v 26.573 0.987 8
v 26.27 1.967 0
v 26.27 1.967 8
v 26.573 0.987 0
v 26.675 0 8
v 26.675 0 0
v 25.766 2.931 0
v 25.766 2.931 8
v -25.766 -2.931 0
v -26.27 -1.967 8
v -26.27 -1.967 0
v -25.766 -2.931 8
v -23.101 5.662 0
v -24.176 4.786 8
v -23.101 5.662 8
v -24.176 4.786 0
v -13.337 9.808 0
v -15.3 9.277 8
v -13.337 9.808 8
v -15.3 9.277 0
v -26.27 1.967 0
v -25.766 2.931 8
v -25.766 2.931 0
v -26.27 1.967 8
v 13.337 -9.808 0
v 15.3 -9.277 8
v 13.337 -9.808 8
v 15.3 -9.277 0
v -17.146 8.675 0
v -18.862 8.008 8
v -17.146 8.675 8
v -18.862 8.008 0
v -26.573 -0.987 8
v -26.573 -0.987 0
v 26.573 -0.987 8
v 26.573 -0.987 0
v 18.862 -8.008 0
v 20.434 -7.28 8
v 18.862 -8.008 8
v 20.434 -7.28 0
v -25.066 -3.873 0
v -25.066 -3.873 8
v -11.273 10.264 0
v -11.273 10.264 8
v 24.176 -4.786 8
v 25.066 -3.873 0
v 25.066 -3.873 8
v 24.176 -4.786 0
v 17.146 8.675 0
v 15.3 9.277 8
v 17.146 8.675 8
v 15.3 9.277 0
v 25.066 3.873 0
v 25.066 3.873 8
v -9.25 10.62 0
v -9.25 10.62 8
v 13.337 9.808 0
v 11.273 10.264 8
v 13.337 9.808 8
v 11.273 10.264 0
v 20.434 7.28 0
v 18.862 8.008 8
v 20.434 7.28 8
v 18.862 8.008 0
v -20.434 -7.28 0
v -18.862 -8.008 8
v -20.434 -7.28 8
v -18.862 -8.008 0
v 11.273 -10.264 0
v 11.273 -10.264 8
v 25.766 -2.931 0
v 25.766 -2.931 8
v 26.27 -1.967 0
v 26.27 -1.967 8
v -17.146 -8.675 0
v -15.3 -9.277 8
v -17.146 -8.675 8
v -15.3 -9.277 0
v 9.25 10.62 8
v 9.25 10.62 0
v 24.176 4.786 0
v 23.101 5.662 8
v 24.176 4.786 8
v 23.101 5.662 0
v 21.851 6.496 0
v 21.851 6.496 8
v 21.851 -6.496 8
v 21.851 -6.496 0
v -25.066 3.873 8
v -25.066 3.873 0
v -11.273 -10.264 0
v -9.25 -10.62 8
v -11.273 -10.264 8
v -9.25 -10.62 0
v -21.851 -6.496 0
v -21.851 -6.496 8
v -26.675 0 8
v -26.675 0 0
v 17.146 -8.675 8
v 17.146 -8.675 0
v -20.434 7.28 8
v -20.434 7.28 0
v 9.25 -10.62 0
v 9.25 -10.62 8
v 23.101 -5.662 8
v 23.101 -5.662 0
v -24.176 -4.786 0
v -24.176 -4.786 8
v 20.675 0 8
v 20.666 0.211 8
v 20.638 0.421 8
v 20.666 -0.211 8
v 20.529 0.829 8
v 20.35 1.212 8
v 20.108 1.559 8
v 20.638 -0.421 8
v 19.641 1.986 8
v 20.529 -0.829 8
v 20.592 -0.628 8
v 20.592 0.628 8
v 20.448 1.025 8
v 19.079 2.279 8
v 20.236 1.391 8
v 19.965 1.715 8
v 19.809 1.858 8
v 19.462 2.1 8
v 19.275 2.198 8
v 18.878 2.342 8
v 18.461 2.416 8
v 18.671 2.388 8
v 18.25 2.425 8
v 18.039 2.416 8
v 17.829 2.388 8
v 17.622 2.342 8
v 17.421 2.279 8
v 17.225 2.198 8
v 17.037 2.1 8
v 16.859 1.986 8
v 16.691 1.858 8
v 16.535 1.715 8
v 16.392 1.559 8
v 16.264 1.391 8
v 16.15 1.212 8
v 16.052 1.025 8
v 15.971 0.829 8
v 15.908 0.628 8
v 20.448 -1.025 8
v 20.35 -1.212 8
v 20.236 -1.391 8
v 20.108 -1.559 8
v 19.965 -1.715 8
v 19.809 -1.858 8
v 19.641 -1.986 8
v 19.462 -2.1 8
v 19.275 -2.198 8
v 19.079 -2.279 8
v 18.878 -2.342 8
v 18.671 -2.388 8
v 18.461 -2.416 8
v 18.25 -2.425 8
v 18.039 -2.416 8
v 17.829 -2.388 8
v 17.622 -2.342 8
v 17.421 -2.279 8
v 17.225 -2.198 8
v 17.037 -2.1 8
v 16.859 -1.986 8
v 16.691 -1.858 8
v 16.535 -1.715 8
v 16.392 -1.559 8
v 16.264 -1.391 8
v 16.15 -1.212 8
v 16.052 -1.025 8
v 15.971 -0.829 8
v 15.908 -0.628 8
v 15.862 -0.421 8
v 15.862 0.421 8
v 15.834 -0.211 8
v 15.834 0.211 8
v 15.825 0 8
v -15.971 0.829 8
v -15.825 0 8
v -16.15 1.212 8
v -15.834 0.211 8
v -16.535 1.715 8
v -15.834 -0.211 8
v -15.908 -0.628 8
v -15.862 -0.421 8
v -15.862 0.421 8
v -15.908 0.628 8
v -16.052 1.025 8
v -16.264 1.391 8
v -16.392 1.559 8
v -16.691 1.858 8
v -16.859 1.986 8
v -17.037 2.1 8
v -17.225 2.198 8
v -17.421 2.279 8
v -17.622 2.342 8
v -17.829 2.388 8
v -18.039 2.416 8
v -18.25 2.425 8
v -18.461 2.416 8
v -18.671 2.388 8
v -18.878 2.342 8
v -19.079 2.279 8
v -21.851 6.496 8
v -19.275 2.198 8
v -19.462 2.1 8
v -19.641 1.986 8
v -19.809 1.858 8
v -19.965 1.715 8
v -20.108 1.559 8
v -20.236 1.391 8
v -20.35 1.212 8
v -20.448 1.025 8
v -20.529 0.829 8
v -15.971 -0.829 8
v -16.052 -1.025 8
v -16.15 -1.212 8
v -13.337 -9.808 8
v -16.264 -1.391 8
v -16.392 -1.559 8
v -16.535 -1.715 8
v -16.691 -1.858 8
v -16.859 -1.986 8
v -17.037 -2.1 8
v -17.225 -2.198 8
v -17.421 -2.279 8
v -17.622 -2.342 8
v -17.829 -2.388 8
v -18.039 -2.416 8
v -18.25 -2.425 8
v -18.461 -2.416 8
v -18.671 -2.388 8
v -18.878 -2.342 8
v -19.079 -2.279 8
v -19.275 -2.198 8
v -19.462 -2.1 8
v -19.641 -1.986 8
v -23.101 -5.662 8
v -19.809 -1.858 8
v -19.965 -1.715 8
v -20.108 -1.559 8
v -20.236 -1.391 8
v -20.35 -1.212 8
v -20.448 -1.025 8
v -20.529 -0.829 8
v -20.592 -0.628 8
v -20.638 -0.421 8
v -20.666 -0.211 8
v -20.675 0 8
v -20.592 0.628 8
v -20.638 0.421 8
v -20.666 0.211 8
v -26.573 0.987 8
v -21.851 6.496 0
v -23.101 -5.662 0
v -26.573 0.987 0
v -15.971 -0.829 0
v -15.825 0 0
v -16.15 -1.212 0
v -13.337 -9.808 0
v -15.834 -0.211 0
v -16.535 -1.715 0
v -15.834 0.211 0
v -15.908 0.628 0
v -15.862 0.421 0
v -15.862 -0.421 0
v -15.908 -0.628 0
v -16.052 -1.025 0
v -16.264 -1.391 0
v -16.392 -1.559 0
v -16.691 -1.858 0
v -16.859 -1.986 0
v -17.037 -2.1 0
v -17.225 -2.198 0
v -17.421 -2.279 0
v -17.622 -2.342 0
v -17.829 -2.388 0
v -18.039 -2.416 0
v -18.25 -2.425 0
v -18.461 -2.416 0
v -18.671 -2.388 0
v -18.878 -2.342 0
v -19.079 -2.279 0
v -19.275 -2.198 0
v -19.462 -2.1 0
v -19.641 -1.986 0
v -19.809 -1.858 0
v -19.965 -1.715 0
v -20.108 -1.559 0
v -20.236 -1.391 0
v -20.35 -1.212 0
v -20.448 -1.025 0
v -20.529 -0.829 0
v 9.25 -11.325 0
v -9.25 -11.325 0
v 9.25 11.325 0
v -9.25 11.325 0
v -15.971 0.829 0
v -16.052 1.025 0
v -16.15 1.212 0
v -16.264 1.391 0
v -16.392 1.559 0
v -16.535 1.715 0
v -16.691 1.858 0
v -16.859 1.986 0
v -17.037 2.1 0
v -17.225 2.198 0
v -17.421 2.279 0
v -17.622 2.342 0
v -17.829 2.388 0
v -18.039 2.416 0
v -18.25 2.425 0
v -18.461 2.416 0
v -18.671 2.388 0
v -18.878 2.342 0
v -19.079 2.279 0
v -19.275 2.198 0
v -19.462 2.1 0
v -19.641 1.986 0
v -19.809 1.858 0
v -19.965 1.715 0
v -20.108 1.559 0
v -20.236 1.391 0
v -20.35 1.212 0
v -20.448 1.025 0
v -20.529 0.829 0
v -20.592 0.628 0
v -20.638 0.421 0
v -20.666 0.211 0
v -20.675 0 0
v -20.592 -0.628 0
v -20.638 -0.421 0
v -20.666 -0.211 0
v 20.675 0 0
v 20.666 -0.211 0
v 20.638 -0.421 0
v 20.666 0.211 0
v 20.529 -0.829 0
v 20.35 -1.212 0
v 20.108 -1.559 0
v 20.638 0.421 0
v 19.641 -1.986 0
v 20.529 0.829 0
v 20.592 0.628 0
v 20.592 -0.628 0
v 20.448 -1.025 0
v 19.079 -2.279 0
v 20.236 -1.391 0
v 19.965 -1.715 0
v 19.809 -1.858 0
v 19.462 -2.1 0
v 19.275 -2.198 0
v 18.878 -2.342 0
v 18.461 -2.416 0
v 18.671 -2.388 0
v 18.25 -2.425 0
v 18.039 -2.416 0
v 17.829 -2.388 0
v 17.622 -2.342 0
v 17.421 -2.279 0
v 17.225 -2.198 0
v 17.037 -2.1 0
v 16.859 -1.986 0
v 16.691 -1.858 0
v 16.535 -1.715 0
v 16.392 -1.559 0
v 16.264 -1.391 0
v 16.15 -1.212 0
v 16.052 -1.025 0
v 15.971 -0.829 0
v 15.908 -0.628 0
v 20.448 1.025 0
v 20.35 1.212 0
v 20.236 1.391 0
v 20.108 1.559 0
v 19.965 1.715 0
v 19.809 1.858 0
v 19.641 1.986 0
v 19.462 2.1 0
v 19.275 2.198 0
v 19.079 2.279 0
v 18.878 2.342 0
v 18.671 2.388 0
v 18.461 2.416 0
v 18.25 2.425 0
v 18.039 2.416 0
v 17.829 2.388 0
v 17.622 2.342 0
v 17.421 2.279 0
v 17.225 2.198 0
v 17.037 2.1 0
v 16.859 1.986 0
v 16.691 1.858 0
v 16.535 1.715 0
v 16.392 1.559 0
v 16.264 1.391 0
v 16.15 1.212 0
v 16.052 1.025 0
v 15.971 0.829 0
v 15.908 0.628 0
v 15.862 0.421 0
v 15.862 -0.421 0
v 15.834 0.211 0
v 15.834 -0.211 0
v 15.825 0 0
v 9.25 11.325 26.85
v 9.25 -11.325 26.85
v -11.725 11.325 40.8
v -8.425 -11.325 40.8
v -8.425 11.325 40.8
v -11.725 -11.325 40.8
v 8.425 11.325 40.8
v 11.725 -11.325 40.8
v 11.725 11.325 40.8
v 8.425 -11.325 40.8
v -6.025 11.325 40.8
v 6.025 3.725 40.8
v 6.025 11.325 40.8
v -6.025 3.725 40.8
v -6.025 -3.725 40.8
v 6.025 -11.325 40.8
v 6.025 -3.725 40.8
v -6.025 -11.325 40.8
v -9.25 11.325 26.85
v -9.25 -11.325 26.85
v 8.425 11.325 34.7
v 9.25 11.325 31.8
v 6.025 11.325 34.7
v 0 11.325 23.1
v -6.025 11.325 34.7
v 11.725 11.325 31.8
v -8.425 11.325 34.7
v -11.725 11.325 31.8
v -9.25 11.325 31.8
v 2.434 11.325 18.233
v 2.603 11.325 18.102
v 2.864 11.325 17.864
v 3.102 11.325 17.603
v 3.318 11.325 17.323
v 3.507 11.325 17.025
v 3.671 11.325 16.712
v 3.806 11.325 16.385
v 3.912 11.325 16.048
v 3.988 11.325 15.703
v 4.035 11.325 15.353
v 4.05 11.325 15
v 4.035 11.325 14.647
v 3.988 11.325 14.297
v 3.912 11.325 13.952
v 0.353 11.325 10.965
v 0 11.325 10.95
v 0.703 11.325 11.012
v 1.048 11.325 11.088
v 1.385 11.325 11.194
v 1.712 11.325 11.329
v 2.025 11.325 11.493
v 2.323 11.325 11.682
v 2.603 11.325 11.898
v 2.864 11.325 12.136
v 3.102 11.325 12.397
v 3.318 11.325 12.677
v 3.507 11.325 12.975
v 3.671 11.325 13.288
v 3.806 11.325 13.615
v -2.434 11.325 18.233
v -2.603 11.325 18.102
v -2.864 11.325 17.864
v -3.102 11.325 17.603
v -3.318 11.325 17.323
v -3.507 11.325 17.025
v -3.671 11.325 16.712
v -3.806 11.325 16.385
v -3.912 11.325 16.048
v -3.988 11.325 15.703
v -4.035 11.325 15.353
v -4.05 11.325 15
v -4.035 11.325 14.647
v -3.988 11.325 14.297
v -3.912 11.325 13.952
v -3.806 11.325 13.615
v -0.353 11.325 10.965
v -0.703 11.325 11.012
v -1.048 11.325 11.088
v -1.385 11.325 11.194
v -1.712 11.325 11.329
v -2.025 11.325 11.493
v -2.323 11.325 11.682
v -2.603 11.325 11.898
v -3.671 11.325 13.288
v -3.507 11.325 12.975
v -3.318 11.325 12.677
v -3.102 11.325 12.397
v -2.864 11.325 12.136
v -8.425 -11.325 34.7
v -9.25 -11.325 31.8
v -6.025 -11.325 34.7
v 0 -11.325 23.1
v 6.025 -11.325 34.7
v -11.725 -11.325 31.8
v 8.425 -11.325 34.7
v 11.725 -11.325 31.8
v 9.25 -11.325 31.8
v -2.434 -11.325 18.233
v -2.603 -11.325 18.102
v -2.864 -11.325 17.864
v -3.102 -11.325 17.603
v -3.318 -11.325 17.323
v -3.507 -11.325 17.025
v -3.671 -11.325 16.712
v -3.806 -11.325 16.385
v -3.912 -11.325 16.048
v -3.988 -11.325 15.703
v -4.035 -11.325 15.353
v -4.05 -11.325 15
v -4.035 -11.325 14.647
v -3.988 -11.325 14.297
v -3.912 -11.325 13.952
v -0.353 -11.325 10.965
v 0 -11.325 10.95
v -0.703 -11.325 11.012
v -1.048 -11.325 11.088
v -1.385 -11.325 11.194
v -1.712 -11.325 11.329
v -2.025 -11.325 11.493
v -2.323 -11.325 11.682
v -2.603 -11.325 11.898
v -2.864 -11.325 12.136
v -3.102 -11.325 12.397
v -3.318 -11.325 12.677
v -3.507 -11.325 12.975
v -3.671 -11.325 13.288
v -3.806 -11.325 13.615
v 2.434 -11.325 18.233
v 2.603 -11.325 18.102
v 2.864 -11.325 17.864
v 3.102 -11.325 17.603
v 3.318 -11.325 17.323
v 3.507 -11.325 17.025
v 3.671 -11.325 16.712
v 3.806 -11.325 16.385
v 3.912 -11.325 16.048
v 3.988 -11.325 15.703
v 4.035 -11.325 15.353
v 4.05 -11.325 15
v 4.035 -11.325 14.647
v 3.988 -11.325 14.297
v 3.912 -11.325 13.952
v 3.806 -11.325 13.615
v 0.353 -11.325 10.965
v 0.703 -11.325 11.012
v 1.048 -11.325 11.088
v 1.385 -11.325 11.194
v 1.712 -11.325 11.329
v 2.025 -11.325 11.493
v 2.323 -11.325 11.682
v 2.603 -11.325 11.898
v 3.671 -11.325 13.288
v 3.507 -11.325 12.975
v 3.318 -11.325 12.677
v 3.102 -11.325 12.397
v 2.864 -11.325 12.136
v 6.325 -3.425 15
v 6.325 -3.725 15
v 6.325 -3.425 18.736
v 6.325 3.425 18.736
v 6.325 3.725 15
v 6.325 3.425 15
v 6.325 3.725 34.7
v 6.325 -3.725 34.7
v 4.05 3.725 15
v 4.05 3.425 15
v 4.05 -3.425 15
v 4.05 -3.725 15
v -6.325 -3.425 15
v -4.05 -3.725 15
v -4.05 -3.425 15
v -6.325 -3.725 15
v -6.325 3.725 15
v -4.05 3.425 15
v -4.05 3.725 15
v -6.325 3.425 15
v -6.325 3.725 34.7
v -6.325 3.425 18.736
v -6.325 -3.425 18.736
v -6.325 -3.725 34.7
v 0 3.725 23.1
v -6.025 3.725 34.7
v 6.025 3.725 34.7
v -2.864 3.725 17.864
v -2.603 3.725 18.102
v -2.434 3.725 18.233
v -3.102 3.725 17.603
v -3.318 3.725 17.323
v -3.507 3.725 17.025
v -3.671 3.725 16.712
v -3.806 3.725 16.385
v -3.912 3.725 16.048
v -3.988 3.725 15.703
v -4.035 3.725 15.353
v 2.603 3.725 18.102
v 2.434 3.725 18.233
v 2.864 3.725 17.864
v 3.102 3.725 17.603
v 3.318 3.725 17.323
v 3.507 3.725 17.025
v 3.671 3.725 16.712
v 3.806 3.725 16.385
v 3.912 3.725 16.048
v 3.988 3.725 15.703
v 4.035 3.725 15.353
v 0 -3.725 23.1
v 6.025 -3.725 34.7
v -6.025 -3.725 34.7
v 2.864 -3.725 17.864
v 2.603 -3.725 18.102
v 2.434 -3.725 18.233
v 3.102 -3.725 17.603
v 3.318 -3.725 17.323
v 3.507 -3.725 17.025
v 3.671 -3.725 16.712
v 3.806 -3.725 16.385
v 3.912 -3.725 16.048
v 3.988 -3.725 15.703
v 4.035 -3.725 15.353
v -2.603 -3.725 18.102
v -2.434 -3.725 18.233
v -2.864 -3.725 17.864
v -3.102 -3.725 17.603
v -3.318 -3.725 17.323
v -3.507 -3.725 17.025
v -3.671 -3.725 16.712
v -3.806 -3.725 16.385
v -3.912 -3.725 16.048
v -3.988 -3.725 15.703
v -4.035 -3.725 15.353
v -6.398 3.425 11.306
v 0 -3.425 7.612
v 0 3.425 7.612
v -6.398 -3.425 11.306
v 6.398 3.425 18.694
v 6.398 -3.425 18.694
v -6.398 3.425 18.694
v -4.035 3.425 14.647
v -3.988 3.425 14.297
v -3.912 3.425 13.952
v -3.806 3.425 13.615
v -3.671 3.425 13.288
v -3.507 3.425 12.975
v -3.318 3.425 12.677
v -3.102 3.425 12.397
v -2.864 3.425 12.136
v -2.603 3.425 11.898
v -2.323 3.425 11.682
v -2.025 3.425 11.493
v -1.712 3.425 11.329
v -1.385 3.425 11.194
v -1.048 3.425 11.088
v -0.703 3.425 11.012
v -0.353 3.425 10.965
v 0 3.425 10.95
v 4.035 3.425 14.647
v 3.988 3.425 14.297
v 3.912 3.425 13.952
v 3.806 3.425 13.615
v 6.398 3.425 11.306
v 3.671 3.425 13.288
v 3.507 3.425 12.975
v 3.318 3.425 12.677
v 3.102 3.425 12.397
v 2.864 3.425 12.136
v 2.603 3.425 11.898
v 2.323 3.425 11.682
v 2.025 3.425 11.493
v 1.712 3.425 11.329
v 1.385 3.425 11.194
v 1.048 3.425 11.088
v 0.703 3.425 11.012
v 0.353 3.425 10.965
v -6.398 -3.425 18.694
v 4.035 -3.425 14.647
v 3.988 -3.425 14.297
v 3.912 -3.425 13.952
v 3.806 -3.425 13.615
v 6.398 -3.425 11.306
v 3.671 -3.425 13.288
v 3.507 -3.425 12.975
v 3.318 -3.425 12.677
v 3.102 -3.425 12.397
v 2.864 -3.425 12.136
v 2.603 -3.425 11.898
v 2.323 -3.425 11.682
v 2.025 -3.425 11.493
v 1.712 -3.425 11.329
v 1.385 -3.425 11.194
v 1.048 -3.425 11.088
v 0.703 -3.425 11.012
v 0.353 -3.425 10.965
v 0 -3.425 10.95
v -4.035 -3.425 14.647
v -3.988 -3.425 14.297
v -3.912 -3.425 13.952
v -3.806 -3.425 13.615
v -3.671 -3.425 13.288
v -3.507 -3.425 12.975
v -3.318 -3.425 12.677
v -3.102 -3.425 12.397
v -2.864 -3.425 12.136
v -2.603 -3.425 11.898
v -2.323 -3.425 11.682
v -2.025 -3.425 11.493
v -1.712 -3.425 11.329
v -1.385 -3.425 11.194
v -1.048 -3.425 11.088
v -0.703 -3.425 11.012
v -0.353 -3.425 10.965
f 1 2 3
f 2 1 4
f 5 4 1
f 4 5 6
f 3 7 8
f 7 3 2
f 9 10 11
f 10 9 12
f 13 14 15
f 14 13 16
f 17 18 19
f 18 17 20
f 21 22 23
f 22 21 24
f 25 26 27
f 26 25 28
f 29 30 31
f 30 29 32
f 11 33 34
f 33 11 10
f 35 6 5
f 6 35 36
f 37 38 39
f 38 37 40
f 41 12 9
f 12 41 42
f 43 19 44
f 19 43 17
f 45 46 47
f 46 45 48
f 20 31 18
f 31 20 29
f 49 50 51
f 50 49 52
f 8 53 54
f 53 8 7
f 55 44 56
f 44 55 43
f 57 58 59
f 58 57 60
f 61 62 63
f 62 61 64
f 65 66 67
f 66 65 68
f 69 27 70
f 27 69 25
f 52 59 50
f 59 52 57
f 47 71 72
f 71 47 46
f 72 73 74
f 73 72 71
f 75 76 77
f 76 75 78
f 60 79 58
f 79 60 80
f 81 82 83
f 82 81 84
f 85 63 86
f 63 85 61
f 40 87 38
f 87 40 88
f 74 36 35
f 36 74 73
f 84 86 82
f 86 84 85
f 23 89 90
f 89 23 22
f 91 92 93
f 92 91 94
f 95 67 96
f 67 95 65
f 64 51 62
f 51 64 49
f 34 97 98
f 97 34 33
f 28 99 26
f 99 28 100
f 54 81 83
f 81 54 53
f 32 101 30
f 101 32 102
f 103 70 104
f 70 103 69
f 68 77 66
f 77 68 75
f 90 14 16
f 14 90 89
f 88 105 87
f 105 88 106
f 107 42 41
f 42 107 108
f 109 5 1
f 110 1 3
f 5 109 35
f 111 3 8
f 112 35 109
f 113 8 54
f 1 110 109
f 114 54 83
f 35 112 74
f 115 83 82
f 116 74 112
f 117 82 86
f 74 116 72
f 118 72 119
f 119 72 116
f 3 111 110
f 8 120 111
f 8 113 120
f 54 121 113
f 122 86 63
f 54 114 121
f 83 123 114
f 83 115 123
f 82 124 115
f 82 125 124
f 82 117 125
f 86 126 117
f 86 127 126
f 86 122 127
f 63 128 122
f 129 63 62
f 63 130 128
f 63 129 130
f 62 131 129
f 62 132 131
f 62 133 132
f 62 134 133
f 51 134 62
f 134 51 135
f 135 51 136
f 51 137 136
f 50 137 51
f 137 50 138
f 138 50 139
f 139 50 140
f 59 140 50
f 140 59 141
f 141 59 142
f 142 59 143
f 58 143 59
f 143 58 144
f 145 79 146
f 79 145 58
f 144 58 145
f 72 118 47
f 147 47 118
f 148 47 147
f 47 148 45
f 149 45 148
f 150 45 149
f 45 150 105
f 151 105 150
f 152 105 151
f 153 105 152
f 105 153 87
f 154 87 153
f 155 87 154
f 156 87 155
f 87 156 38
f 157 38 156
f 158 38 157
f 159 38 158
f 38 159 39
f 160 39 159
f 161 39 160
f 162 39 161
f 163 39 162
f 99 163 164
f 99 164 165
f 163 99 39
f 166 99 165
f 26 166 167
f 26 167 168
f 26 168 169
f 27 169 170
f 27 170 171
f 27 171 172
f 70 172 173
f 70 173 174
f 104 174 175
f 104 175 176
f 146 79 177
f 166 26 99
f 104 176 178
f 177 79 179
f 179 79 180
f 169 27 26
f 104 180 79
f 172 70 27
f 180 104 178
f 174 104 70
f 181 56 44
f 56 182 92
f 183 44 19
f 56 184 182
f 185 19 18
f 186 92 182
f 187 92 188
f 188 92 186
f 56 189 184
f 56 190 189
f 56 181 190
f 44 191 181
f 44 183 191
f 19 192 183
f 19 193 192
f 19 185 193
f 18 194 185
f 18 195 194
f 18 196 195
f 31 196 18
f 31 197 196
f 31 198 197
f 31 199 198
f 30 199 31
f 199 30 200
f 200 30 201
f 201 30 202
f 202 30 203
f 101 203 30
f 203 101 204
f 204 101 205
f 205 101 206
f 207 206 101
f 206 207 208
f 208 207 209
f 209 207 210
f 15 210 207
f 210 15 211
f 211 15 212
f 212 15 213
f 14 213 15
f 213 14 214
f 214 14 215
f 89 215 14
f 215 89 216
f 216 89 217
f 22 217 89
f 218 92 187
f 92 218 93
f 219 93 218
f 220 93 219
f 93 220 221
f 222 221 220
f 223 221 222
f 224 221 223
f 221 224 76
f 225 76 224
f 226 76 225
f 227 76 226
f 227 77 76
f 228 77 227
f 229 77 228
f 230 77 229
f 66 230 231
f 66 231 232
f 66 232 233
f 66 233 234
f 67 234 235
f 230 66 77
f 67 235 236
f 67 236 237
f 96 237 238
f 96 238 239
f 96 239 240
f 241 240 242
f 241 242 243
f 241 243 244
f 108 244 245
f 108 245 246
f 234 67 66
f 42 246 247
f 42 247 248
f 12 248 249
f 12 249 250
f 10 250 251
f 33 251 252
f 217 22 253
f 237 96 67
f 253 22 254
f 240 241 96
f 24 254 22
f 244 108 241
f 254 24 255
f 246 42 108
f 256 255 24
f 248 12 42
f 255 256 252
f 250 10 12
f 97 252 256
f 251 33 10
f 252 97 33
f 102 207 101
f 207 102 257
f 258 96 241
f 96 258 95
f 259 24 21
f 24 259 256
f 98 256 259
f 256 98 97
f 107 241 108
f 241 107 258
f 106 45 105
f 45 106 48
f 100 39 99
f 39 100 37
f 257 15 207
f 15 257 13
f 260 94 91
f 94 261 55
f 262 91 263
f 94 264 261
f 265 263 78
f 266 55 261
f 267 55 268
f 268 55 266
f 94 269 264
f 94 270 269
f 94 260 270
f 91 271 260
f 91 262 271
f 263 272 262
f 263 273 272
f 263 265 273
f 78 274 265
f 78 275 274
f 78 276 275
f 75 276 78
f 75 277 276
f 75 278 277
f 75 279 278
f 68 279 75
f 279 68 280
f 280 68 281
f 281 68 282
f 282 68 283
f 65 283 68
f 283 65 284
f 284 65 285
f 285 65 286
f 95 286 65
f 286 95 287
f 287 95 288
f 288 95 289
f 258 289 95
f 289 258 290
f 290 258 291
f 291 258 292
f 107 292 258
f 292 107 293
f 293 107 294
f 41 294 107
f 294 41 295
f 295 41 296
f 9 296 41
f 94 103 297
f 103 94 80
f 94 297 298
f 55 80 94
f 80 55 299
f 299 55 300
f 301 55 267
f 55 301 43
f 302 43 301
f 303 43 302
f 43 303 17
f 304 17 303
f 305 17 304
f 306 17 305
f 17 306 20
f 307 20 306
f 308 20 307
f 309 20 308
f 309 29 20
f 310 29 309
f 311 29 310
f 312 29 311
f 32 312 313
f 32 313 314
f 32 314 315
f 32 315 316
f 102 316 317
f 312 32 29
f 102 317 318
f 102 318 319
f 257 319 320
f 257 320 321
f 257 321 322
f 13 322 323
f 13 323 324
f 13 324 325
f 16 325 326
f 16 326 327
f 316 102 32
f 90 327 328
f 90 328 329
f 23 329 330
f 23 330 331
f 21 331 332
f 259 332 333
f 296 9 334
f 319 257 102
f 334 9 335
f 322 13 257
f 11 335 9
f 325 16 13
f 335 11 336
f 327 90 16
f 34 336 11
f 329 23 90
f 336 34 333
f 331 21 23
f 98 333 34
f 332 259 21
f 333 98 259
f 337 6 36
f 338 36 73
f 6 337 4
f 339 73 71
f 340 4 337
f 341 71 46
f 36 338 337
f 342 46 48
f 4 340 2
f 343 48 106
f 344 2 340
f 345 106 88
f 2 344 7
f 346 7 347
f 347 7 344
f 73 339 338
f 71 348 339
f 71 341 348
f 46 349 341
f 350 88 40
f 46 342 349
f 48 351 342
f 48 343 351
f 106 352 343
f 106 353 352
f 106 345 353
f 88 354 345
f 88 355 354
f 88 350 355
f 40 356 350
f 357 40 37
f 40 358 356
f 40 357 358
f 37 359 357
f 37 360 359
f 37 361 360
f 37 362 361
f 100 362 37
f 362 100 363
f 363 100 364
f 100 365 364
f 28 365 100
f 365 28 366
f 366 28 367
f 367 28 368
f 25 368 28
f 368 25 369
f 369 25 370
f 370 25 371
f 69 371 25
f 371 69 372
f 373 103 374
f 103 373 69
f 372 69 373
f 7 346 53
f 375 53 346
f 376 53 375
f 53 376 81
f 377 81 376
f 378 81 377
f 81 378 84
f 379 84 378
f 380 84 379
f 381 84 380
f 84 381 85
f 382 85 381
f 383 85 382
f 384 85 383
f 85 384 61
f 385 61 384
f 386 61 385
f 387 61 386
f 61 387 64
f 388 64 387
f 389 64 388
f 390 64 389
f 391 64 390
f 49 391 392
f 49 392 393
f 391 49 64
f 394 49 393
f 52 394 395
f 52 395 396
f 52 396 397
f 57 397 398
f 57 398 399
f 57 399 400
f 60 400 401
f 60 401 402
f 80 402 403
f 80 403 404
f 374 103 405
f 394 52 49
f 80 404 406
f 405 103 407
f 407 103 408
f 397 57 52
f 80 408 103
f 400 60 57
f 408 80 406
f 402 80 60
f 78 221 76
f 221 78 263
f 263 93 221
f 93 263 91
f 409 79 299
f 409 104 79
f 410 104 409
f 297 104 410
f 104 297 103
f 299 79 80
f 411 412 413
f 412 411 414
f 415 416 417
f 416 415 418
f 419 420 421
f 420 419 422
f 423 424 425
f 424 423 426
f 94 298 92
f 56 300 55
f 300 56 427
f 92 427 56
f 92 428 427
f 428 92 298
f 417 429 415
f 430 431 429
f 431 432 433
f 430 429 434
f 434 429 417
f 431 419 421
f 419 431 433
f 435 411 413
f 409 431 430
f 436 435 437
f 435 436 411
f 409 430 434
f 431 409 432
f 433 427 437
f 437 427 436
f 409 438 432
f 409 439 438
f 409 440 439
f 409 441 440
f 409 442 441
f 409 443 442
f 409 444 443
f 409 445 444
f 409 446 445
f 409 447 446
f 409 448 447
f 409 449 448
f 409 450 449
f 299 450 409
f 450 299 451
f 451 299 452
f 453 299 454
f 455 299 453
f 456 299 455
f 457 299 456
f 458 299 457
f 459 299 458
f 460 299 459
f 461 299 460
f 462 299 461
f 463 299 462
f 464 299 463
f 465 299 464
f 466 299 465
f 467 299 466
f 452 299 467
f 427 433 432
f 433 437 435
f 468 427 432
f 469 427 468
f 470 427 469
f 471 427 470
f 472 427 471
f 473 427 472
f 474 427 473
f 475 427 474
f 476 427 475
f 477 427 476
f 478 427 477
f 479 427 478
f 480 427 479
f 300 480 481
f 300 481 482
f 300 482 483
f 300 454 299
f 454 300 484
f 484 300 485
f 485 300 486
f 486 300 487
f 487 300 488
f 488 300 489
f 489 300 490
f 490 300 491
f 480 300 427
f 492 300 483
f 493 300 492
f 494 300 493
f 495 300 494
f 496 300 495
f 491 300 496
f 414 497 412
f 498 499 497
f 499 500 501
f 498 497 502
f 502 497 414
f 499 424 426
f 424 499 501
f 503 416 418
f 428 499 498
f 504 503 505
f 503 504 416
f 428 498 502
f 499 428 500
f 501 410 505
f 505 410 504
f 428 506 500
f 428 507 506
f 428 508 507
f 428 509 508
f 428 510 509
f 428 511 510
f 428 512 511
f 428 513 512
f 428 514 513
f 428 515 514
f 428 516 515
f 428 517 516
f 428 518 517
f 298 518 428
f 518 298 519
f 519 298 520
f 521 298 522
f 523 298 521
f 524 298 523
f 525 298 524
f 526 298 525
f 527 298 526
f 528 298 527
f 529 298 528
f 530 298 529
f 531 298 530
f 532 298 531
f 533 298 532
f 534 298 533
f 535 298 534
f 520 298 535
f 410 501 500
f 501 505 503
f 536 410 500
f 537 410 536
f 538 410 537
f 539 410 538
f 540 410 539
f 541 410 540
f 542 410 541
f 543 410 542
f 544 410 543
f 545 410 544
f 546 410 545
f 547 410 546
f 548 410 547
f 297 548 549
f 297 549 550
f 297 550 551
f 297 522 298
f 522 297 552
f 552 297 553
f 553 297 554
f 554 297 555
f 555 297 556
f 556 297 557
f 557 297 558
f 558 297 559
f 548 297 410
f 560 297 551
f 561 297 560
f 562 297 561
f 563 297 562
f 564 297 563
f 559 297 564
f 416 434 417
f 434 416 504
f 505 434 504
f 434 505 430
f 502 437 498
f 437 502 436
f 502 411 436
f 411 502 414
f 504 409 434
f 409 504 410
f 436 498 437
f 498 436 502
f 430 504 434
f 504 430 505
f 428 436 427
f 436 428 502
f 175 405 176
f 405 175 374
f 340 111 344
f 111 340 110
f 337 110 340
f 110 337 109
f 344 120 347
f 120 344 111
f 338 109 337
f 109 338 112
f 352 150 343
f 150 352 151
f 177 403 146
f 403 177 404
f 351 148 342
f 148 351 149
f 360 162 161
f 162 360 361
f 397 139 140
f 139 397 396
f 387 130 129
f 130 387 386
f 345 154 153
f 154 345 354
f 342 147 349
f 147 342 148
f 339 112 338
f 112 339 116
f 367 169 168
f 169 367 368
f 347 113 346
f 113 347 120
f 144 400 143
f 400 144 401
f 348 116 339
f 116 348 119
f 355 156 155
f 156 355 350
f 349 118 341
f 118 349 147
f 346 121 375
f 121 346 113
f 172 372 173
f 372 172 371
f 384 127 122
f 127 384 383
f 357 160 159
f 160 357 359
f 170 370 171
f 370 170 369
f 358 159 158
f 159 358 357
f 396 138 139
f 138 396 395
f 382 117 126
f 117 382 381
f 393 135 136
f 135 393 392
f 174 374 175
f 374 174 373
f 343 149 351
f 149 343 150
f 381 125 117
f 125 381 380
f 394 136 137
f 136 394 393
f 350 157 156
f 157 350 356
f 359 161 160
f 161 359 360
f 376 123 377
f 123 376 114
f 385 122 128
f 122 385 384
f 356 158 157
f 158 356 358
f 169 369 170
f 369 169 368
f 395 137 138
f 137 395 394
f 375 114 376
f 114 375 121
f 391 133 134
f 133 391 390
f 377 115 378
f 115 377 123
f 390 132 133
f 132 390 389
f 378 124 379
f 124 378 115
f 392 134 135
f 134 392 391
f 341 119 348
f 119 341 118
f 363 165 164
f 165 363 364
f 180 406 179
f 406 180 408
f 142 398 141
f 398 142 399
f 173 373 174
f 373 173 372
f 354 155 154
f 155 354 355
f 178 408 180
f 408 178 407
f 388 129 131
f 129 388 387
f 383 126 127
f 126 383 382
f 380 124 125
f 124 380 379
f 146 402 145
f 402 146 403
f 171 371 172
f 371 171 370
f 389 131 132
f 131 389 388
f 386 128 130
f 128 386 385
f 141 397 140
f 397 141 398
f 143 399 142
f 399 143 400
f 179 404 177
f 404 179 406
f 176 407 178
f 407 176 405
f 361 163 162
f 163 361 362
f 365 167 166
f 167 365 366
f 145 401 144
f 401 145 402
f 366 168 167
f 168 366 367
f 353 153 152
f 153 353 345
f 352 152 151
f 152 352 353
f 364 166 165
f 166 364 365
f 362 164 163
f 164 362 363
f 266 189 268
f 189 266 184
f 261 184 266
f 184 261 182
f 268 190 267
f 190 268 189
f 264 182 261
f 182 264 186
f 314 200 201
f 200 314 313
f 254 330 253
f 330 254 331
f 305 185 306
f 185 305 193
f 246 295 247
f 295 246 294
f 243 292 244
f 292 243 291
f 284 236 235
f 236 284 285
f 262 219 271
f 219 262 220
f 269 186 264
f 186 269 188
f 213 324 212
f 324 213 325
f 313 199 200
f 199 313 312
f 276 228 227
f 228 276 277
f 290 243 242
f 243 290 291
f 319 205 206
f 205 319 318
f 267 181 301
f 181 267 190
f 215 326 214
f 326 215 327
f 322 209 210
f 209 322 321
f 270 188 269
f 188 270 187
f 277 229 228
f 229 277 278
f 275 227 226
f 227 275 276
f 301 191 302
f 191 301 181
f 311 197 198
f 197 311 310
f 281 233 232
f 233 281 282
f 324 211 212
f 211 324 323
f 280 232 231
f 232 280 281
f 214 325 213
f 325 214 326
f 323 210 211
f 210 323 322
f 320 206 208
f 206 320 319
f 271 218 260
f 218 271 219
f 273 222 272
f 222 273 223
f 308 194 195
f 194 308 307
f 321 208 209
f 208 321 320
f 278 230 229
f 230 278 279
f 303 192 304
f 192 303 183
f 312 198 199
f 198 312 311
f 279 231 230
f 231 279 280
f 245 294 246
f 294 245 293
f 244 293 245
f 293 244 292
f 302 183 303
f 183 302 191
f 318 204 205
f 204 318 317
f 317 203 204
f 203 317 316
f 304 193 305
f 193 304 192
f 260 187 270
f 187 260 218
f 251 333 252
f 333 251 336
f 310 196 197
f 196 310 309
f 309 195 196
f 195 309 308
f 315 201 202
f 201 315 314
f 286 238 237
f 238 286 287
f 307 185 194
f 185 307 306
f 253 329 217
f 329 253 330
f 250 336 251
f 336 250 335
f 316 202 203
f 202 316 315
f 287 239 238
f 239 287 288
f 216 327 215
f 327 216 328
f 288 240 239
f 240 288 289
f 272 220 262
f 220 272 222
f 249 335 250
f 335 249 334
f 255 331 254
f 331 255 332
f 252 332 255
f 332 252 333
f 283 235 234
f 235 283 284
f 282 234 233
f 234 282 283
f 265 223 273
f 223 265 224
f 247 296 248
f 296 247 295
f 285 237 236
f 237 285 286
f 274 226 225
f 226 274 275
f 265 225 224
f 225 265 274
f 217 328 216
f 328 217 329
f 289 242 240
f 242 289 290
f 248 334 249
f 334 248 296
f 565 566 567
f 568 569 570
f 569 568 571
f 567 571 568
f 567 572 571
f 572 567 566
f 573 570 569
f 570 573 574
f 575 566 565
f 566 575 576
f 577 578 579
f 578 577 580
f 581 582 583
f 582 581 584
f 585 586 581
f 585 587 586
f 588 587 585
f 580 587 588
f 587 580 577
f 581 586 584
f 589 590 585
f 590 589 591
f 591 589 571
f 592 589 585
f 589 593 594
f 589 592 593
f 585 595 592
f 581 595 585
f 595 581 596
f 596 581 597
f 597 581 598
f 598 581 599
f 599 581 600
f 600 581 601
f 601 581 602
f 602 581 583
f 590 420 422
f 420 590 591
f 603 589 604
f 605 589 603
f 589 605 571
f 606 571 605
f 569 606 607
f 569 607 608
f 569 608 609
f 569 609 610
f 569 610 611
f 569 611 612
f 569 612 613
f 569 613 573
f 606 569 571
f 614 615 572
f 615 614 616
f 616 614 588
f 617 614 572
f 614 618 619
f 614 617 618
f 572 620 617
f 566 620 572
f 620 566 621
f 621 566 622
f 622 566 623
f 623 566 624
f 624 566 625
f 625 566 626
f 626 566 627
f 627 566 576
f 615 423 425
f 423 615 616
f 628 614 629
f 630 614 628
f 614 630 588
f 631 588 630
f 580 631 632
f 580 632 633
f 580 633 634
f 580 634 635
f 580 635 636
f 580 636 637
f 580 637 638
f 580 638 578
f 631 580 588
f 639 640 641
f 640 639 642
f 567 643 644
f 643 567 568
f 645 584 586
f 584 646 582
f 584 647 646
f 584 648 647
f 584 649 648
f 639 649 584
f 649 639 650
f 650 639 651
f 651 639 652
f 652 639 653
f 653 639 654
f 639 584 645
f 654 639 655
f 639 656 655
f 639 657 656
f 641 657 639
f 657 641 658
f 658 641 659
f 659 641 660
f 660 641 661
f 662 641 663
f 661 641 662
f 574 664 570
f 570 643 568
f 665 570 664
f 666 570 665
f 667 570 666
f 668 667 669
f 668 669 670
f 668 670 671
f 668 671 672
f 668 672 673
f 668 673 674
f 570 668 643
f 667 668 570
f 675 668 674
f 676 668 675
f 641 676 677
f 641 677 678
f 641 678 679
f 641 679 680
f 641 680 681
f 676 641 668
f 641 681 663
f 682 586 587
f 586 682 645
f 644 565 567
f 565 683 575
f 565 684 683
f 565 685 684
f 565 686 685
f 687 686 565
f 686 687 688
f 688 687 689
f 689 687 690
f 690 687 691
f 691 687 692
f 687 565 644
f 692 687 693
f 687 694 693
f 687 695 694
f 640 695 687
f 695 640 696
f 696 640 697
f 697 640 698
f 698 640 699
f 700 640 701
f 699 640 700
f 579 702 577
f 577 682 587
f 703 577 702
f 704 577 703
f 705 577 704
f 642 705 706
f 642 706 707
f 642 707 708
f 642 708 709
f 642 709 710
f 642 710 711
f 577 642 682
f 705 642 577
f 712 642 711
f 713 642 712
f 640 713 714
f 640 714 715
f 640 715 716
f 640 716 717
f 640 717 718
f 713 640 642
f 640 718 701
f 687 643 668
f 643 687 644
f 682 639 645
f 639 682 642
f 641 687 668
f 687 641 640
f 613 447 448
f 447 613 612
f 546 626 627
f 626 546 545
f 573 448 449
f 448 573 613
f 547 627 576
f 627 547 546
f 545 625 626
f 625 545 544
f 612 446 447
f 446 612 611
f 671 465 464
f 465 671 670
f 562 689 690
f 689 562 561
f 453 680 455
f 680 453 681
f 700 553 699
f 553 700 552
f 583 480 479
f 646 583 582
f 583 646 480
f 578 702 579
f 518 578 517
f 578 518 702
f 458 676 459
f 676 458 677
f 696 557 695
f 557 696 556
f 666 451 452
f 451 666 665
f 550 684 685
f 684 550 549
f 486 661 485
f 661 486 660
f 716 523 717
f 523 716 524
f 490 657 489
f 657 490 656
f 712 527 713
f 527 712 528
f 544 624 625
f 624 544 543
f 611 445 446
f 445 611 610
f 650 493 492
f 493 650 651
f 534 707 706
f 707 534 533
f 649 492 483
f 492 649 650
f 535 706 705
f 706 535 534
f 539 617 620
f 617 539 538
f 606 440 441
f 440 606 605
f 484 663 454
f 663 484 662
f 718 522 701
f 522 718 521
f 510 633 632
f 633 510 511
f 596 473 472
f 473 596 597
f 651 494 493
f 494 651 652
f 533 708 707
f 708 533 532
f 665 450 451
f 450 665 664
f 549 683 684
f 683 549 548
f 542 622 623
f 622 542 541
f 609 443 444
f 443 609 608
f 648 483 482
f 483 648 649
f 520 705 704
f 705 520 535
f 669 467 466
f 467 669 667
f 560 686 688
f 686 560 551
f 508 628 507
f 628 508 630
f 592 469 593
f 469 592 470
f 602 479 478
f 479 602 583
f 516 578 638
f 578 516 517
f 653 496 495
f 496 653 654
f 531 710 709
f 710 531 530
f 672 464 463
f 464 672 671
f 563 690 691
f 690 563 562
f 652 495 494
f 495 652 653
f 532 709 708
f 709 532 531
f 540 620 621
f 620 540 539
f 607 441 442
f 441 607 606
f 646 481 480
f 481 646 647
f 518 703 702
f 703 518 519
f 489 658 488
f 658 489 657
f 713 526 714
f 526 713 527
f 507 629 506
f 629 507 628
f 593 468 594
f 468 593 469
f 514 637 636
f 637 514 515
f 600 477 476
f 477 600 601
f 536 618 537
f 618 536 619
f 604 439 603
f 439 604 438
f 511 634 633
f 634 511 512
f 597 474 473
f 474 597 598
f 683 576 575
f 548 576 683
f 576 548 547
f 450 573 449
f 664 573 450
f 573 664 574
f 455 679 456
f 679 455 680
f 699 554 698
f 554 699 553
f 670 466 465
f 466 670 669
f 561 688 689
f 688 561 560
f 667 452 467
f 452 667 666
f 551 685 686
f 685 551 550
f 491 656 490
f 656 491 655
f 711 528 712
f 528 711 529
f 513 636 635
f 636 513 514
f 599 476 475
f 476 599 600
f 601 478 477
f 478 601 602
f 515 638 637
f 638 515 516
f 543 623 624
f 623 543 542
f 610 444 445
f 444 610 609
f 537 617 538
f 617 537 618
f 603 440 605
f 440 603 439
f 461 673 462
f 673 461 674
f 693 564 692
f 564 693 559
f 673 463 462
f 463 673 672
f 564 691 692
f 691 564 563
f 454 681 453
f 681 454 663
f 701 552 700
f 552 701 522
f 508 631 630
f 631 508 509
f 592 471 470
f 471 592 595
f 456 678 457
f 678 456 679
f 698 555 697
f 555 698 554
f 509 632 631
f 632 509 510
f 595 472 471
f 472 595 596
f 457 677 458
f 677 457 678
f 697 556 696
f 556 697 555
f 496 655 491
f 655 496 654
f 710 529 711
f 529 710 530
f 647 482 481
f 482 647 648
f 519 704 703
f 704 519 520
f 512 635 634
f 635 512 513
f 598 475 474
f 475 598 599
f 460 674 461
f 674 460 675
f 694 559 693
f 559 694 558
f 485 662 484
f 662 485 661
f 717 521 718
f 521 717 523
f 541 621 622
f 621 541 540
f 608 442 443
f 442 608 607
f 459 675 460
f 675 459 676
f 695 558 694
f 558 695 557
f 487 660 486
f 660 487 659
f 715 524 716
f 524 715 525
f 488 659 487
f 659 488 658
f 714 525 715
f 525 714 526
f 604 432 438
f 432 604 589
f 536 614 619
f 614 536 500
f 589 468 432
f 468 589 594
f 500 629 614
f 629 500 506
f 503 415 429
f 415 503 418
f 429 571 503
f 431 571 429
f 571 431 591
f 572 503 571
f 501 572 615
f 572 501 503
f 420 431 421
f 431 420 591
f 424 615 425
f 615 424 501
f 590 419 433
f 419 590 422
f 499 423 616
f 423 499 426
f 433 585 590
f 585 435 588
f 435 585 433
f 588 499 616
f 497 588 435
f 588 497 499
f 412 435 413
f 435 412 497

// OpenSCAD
Gap = 0.2;
$fn = 72;

Guide(false);

module Guide(extraClearance) {
    Padding = 3.0;
    SupportThickness = 8.0;

    HexFlatDiameter = 12.45;
    HexRadius = HexFlatDiameter/(2 * cos(30));
    HexThickness = 6.65;

    MountOffset = 22;
    ThreadRodDiameter = 8.1;

    BoltDiameter = 4.85;
    BoltSeparation = 36.5;
    BoltHeadDiameter = 9.0; // The standard indicates 8mm for 5mm screws
    
    Depth = HexThickness + 2*SupportThickness;
    RodOffset = 15; // This is arbitrary, distance from rod to where we mount the bar
    ToTheSky = 100;

    // Measurement of the outside of the channel is 16.5 and 12.37 inside
    // that's 3.2mm for two walls. Add it to smaller value or subtract from larger to get the width
    ChannelWidth = 14.45;
    // Height from the frame to the top of the channel
    ChannelHeight = 12.90; // From the frame to the top of the channel
    // How much into channel we're going. It doesn't have to be deep
    DepthIntoChannel = 6.0;
    // How thick is the channel wall
    ChannelThickness = 2.2;

    BoltRadius = BoltDiameter / 2;
    Width = BoltSeparation + 2*BoltRadius + 2*Padding;
    WidthWithoutBolts = BoltSeparation - 2*BoltHeadDiameter;

    // Additional support for 45 degree angle
    WidthAroundChannel = ChannelWidth + 3*Padding;
    HeightOfSupport = WidthAroundChannel-WidthWithoutBolts;

    // Calculate the center of the rod
    // Use the same values as FrameToMotorAdapter
    MotorRadius = 26.0;
    HeadHeight = 4.5 + Gap;
    ThreadHeight = 2.0;
    FrameAdapterHeight = ThreadHeight + HeadHeight;
    CenterOfTheRod = MotorRadius + FrameAdapterHeight;
    // Note that the object sits at Z=0
    // and RodOffset looking from Z=0 equals CenterOfTheRod from Z=max
    // this is where the channel starts
    ZMax = RodOffset + CenterOfTheRod;
    ChannelOffset = ZMax - ChannelHeight;
    // Allow clearance of 8mm, which is the distance from frame to a hex head holding the channel is 8mm
    Height = ChannelOffset + DepthIntoChannel;

    echo(str("Rod center:", RodOffset));
    echo(str("Furthest reach:", Height));
    echo(str("Distance between rod center and furthest reach:", Height - RodOffset));

    difference() {
        // Main body
        union() {
            translate([0, 0, 0])
                scale([Width/2 + Padding, Depth/2, 1]) {
                    cylinder(r = 1, h = SupportThickness);
                }
            translate([0, 0, Height/2])
                cube([WidthWithoutBolts, Depth, Height], center = true);

            translate([0, 0, ZMax - ChannelHeight + (DepthIntoChannel - Padding)/2])
                cube([WidthAroundChannel, Depth, DepthIntoChannel + Padding], center = true);

            // 45 degree angle connector
            rotate([90, 0, 0])
            translate([0, Height - DepthIntoChannel - Padding - HeightOfSupport, 0])
                linear_extrude(height = Depth, center = true)
                    polygon(points = [
                    [-WidthAroundChannel/2, HeightOfSupport],
                    [WidthAroundChannel/2, HeightOfSupport],
                    [WidthWithoutBolts/2, 0],
                    [-WidthWithoutBolts/2, 0],
                    ]);
        }

        // Bolts for mounting the bearing
        union() {
            translate([BoltSeparation / 2, 0, SupportThickness/2])
                cylinder(r = BoltRadius, h = SupportThickness + Gap, center = true);
            translate([-BoltSeparation / 2, 0, SupportThickness/2])
                cylinder(r = BoltRadius, h = SupportThickness + Gap, center = true);
        }

        // Nut which attaches to the rod
        union () {
            translate([0, 0, RodOffset + ToTheSky/2])
                // Gap*4 should make it easy to insert the nut
                cube([HexFlatDiameter+Gap, HexThickness+Gap*4, ToTheSky], center=true);
            
            translate([0, 0, RodOffset])
                rotate([90,30,0])
                    cylinder(r = HexRadius+Gap, h=HexThickness+Gap, center=true, $fn = 6);
            
            // TODO: Make the roof triangular so that there is no support
            translate([0, 0, RodOffset])
                rotate([90,0,0])
                    cylinder(r=ThreadRodDiameter/2, h = 100, center=true);

            // >45 degree roof
            rotate([90, 0, 0])
            translate([0, RodOffset, 0])
                linear_extrude(height = Depth + Gap, center = true)
                    polygon(points = [
                    [-ThreadRodDiameter/2, 0],
                    [ThreadRodDiameter/2, 0],
                    [0, ThreadRodDiameter],
                    ]);
        }

        // Channel
        union () {
            translate([ChannelWidth / 2, 0, ChannelOffset + DepthIntoChannel/2])
                cube([ChannelThickness + Gap, ToTheSky, DepthIntoChannel + Gap], center=true);
            translate([-ChannelWidth / 2, 0, ChannelOffset + DepthIntoChannel/2])
                cube([ChannelThickness + Gap, ToTheSky, DepthIntoChannel + Gap], center=true);
        }
    }
    /*
    difference() {
        translate([0,0,-MountOffset]) {
            intersection () {
                scale([Width/2, Depth/2, 1]) {
                    cylinder(r = 1, h = Thickness);
                }
                square([Width, Depth]);
            }
        }
        union () {
            translate([0,0,50])
                cube([HexFlatDiameter+Gap, HexThickness+Gap, 100], center=true);
            
            rotate([90,30,0])
            cylinder(r = HexRadius+Gap, h=HexThickness+Gap, center=true, $fn = 6);
            
            rotate([90,0,0])
                cylinder(r=ThreadRodDiameter/2, h = 100, center=true);

            translate([0,0,-ChannelOffset])
                rotate([90,0,0])            
                    cylinder(r=GuideRodRadius, h = 100, center = true);
            
            translate([BoltSeparation/2,0,0])
                cylinder(r=BoltDiameter/2, h=100, center=true);
            translate([-BoltSeparation/2,0,0])
                cylinder(r=BoltDiameter/2, h=100, center=true);
        }
    }
    */
}
